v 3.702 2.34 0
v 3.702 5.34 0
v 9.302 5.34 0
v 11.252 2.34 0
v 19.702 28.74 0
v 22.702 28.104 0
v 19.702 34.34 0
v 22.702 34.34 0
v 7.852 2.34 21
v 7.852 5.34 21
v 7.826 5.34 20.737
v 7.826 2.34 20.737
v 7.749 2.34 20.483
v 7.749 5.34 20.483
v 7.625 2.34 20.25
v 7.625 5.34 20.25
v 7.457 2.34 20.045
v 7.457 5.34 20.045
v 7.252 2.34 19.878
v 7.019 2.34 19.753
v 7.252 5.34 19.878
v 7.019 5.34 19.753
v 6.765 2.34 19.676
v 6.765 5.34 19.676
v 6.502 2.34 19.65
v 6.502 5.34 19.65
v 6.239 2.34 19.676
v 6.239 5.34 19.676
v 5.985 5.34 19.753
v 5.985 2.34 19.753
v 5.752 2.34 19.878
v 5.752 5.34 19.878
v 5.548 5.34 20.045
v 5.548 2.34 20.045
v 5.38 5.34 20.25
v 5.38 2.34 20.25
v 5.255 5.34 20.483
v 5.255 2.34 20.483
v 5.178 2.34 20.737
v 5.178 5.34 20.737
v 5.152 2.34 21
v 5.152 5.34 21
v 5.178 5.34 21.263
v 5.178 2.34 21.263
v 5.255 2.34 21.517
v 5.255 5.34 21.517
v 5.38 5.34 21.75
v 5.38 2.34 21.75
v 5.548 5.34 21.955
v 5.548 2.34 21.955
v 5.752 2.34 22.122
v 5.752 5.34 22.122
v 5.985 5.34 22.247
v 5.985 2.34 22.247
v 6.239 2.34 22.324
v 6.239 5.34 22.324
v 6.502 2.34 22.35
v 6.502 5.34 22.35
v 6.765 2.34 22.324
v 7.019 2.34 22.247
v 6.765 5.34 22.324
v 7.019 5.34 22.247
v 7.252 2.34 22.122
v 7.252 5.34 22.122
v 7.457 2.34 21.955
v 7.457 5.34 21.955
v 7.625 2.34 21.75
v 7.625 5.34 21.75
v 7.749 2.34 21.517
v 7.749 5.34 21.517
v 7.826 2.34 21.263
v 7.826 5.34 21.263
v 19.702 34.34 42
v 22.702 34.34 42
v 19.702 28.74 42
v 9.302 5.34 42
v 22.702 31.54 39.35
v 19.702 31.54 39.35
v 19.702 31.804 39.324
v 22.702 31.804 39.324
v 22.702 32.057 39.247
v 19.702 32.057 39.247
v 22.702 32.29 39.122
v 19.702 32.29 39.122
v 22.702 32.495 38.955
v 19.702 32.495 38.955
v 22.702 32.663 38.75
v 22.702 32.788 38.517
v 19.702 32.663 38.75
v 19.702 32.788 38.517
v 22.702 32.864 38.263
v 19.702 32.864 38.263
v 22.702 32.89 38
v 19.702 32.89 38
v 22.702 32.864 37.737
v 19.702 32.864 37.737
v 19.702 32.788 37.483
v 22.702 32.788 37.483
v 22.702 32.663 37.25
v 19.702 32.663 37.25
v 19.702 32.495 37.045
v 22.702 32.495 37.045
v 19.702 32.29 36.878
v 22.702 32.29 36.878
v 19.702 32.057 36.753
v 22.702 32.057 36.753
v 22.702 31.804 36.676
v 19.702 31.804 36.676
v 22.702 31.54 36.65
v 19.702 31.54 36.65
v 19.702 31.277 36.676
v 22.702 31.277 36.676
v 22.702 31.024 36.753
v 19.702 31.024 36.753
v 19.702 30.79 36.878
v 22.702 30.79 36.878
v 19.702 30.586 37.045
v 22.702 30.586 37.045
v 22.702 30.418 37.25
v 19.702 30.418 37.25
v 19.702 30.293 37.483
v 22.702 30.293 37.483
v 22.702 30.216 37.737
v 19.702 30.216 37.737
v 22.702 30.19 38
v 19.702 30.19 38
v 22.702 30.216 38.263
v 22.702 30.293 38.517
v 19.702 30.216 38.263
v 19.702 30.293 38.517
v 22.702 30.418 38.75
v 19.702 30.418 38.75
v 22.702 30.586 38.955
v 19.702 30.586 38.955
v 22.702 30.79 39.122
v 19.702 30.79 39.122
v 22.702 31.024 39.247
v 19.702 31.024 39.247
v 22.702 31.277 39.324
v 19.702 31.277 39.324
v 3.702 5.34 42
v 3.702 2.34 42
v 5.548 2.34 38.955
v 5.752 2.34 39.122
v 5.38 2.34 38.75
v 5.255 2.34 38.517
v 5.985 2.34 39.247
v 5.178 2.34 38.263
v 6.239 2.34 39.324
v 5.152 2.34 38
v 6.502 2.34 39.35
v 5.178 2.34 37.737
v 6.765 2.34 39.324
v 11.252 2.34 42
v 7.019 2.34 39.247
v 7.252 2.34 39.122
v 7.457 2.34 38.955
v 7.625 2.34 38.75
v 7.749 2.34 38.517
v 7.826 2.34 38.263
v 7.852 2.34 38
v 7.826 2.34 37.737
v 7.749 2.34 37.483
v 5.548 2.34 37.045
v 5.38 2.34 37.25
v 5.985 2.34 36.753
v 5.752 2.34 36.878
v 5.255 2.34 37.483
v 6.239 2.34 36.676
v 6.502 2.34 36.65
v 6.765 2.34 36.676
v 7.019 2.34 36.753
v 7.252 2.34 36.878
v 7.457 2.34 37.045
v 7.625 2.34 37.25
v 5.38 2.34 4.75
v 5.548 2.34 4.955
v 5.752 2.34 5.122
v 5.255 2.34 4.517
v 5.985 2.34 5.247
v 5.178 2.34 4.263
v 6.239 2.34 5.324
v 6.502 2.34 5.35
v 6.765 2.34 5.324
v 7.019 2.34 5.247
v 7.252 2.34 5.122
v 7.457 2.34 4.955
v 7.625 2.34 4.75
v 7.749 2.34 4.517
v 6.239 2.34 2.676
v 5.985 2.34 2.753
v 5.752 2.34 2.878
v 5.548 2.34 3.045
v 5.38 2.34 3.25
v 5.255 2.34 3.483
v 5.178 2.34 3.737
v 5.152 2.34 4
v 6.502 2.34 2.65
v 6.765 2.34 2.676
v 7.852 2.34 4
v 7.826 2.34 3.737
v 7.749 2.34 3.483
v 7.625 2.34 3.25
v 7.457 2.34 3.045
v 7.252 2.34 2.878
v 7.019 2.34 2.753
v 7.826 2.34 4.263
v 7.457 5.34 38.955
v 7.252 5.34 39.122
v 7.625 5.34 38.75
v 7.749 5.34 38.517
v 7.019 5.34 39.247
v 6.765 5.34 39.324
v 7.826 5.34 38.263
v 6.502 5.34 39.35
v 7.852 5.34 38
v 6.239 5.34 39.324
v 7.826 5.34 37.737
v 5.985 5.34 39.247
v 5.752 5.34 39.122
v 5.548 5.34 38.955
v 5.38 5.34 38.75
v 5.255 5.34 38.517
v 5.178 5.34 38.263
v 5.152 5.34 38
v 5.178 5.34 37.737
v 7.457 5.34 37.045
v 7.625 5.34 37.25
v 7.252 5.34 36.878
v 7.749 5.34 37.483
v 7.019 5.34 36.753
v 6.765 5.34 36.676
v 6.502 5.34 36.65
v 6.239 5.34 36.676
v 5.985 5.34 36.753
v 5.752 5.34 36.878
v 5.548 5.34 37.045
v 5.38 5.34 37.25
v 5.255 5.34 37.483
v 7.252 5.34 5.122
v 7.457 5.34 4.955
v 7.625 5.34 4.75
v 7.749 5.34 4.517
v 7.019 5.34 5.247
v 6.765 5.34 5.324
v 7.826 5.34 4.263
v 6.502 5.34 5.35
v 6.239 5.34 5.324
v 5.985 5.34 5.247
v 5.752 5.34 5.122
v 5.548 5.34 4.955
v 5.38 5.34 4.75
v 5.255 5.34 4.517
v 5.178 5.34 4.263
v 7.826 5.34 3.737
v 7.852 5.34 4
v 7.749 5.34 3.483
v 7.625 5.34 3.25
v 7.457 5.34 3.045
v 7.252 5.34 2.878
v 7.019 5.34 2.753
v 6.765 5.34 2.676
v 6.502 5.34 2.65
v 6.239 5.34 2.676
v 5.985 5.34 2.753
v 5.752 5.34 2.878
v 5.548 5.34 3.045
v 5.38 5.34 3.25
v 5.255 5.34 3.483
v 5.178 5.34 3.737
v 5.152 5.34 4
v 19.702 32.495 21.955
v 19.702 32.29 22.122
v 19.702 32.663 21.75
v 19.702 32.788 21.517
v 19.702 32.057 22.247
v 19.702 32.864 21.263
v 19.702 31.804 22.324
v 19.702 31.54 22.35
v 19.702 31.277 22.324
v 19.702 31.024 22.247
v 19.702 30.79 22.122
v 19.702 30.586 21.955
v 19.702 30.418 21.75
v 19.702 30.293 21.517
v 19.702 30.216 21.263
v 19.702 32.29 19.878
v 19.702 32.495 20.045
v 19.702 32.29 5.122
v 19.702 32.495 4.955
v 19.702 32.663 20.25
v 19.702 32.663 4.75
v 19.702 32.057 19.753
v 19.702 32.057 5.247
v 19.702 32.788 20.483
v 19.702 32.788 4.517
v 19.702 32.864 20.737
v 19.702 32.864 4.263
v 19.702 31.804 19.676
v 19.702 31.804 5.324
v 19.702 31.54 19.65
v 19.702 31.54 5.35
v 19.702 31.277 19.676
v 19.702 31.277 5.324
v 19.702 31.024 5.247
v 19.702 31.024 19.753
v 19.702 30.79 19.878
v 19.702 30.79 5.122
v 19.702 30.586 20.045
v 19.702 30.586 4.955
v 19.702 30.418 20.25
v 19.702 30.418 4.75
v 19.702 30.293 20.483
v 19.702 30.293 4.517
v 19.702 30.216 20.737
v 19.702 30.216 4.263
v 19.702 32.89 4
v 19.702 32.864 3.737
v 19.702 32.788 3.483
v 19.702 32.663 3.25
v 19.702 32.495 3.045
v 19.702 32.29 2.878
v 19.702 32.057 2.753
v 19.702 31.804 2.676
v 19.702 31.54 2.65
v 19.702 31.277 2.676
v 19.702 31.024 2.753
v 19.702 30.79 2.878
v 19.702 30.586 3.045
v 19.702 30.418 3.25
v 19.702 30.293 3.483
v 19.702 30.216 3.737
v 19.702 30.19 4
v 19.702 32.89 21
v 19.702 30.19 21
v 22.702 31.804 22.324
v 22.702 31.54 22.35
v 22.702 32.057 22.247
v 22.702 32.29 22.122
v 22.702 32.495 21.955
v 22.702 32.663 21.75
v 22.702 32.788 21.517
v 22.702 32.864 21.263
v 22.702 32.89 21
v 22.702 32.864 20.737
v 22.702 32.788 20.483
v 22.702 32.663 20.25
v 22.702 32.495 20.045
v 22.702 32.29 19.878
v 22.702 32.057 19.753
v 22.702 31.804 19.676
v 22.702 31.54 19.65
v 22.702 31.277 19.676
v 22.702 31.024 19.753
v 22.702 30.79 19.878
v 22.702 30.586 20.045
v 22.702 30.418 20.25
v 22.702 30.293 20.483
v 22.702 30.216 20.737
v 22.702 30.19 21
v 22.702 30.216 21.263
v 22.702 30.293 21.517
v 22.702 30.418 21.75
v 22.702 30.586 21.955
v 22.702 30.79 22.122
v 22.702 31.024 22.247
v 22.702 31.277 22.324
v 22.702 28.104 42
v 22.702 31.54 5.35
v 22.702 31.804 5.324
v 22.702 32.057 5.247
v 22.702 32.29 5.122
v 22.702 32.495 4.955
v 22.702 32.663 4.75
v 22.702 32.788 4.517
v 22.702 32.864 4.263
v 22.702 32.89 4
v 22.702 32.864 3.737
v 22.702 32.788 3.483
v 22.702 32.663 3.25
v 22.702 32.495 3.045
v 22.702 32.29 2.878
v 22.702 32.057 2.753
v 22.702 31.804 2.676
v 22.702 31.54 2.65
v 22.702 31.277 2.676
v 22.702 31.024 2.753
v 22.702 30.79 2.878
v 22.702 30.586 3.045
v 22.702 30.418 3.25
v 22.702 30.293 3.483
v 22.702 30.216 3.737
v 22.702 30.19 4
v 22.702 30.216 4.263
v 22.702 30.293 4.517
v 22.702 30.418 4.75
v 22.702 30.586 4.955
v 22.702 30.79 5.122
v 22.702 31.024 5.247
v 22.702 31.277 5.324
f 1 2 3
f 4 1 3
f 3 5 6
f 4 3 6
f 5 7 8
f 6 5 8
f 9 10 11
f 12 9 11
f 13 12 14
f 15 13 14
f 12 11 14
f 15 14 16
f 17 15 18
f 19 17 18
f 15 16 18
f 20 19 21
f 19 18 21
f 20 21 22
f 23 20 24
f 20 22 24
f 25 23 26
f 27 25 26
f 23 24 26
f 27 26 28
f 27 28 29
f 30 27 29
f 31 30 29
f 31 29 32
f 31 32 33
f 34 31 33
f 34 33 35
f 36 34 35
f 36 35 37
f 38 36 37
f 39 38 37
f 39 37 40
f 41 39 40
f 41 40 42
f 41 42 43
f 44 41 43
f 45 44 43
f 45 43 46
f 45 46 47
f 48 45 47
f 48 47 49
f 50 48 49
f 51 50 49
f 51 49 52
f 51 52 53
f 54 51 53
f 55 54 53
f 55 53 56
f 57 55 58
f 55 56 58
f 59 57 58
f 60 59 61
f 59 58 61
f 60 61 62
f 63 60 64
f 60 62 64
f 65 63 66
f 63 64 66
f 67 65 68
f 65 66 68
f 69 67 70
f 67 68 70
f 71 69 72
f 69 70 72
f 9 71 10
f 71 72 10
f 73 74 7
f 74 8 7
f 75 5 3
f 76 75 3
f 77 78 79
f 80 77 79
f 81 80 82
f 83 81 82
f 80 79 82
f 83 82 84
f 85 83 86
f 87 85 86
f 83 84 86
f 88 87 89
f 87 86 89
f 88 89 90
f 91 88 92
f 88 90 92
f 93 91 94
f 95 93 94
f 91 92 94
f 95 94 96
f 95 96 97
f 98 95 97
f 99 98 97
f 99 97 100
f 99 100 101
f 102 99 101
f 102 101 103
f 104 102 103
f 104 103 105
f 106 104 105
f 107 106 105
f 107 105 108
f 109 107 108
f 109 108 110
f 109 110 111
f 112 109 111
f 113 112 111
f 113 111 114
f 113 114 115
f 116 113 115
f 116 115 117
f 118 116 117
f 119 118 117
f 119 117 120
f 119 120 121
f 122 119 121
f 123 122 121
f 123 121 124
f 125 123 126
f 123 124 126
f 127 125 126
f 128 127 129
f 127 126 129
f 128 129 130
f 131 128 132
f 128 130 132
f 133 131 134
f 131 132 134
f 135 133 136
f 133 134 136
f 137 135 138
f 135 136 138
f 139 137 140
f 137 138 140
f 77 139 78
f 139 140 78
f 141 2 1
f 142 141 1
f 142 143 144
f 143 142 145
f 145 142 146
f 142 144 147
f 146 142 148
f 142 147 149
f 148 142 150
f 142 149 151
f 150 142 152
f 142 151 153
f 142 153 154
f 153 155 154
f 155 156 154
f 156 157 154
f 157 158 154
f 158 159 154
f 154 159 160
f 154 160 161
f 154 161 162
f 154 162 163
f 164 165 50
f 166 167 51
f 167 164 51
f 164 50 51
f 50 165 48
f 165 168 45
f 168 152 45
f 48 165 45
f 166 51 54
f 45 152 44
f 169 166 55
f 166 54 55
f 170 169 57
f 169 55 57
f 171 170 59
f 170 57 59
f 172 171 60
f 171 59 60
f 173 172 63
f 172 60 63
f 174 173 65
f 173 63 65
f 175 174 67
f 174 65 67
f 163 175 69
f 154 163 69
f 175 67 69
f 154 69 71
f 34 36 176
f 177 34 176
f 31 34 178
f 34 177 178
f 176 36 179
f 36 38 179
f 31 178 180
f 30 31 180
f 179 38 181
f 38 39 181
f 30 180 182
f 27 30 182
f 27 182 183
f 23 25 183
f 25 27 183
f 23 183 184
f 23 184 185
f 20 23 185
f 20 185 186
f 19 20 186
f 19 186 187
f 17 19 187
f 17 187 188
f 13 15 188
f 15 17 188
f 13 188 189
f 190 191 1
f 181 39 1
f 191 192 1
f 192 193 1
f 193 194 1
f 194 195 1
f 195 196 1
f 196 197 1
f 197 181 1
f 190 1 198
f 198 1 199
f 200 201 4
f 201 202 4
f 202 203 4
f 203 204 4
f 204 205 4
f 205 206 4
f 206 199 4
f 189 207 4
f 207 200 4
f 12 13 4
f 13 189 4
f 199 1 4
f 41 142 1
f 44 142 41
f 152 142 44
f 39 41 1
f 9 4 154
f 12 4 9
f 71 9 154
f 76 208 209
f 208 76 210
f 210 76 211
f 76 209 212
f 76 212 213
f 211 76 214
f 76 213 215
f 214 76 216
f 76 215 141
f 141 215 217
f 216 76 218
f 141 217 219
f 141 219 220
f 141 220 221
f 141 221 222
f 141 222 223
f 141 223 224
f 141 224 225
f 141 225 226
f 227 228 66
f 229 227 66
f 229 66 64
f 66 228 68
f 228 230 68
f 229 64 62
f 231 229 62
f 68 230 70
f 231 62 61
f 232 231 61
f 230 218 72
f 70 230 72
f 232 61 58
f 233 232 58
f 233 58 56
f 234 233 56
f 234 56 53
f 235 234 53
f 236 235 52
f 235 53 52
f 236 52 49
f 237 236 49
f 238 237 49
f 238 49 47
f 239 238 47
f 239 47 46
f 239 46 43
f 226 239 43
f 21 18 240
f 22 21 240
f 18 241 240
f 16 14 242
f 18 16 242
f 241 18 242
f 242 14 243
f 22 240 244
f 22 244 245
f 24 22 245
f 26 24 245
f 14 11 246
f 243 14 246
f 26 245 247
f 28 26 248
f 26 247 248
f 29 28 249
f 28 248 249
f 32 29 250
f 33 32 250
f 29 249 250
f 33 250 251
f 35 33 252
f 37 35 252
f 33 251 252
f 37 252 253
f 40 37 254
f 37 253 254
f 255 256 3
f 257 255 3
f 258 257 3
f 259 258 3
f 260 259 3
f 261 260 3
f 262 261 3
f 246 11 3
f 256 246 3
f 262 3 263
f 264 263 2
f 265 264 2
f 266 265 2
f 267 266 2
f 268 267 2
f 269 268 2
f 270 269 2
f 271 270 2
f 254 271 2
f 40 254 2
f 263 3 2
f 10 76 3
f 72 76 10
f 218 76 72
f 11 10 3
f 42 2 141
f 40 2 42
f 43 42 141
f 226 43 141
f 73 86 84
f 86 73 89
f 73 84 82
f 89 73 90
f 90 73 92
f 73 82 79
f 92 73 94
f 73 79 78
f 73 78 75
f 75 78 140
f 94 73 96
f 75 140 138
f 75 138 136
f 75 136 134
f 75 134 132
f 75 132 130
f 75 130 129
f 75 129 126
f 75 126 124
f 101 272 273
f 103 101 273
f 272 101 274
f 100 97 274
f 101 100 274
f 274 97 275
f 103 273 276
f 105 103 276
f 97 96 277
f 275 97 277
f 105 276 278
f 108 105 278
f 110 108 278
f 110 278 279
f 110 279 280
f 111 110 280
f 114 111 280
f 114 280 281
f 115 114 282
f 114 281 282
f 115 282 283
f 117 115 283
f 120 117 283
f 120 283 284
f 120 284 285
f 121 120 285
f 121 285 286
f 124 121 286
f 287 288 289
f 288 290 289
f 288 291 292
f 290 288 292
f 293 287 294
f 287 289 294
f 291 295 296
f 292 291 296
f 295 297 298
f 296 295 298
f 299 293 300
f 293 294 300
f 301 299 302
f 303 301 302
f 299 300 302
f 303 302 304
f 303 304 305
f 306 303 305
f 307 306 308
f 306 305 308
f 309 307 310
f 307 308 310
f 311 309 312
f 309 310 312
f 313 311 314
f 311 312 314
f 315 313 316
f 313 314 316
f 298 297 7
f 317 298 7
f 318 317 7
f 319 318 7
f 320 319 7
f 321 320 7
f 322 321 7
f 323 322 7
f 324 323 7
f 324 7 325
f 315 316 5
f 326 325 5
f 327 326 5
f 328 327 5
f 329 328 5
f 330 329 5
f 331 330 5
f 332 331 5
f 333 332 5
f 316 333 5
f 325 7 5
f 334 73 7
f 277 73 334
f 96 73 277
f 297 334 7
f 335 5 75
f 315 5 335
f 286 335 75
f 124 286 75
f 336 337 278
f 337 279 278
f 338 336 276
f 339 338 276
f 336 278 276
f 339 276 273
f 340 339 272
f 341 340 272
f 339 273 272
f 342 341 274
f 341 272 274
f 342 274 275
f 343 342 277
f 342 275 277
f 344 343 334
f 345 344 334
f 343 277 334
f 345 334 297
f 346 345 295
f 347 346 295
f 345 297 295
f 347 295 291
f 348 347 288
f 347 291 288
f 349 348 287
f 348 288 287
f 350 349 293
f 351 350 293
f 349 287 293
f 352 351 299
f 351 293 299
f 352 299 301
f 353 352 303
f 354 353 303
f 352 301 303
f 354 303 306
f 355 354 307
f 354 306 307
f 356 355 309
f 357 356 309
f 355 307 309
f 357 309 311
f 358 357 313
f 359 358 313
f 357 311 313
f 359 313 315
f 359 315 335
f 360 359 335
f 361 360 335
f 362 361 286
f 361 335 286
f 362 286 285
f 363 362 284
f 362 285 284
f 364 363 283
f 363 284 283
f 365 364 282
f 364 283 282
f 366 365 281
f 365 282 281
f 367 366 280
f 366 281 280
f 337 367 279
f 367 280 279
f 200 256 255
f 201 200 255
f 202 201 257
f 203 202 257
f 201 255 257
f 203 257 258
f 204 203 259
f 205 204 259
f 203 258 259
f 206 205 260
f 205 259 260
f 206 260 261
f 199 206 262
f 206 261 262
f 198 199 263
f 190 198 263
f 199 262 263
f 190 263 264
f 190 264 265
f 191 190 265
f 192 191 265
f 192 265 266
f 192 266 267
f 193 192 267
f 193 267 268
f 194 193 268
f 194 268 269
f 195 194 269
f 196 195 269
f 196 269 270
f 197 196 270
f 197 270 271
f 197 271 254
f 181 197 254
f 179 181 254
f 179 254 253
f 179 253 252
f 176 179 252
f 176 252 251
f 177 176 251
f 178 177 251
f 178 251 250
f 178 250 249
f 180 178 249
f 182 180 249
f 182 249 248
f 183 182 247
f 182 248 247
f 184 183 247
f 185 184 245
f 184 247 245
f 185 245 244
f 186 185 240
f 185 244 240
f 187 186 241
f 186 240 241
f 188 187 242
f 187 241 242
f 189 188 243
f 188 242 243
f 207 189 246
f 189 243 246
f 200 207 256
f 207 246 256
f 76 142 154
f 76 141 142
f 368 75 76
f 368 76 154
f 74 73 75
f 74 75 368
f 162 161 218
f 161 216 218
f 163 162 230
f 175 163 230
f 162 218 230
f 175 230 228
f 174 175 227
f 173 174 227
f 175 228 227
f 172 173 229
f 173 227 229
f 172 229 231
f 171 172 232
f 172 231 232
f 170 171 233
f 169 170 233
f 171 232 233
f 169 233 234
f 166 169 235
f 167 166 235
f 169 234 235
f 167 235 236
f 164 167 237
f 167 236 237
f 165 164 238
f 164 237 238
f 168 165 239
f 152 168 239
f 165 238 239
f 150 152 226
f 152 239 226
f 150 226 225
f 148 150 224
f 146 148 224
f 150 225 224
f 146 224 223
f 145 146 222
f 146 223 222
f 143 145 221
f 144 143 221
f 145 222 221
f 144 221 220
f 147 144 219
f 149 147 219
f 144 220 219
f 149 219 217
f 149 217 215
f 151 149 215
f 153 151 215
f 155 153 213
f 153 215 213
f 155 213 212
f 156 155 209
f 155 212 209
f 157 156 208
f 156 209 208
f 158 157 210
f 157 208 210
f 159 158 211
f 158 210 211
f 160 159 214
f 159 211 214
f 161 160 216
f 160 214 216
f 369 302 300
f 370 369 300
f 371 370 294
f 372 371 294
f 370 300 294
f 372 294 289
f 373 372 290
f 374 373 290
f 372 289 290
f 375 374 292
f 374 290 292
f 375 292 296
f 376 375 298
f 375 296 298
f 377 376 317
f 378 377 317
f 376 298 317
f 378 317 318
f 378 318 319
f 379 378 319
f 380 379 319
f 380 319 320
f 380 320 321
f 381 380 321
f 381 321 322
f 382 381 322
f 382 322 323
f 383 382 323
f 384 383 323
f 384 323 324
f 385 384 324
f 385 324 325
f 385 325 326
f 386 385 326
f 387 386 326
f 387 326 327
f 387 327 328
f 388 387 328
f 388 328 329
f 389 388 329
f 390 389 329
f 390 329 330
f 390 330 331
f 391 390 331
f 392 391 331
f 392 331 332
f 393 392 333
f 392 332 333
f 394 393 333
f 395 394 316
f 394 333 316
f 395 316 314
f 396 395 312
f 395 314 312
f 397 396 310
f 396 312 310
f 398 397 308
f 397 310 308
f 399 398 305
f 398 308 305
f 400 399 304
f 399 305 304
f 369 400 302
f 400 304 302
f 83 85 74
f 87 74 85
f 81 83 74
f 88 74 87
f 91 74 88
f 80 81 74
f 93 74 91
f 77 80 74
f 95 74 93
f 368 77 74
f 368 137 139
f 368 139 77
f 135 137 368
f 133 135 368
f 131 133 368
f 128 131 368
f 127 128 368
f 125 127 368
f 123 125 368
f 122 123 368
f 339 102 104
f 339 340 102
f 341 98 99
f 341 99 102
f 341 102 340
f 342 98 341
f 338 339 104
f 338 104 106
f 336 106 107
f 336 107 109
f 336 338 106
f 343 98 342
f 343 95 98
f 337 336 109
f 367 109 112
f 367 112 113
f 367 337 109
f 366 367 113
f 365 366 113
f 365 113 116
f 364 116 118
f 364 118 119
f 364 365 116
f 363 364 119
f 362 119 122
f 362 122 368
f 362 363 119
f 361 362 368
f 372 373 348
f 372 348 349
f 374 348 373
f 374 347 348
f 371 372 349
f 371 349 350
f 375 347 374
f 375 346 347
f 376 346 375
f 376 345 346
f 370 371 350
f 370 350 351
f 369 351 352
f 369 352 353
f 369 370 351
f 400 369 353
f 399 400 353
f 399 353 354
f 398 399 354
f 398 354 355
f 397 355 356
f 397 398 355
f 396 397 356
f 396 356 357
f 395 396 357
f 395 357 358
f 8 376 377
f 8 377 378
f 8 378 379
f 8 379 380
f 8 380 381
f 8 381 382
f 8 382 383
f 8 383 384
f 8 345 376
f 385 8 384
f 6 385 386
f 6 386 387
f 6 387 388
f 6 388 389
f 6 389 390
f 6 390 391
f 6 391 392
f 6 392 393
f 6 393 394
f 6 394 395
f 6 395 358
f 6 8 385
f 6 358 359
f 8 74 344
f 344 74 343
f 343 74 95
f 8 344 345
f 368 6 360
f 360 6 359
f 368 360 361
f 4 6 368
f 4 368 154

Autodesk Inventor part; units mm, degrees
ref_plane "YZ Plane" through (0, 0, 0) normal (1, 0, 0) x (0, 1, 0)
ref_plane "XZ Plane" through (0, 0, 0) normal (0, 1, 0) x (-1, 0, 0)
ref_plane "XY Plane" through (0, 0, 0) normal (0, 0, 1) x (1, 0, 0)
sketch "Sketch1" plane through (0, 0, 0) normal (0, 0, 1) x (1, 0, 0)
  line L0 (22.7021, 34.3404) -> (19.7021, 34.3404)
  line L1 (19.7021, 34.3404) -> (19.7021, 28.7404)
  line L2 (19.7021, 28.7404) -> (9.3021, 5.3404)
  line L3 (22.7021, 28.1038) -> (11.2517, 2.3404)
  line L4 (9.3021, 5.3404) -> (3.7021, 5.3404)
  line L5 (3.7021, 5.3404) -> (3.7021, 2.3404)
  line L6 (22.7021, 34.3404) -> (22.7021, 28.1038)
  line L7 (3.7021, 2.3404) -> (11.2517, 2.3404)
  point P0 (0, 0)
  dimension "d0" = 3
  dimension "d1" = 3
  dimension "d2" = 32
  dimension "d3" = 19
  dimension "d4" = 5.6
  dimension "d5" = 5.6
  dimension "d6" = 3
extrude "Extrusion1" add sketch "Sketch1" along normal blind 42
sketch "Sketch2" plane through (3.7021, 5.3404, 0) normal (0, 1, 0) x (1, 0, 0)
  line L0 (0, -42) -> (5.6, -42) projected
  circle A0 centre (2.8, -4) radius 1.35
  circle A1 centre (2.8, -21) radius 1.35
  circle A2 centre (2.8, -38) radius 1.35
  point P0 (-3.7021, 0)
  dimension "d9" = 2.7
  dimension "d10" = 2.7
  dimension "d11" = 2.7
  dimension "d12" = 17
  dimension "d13" = 17
  dimension "d14" = 4
extrude "Extrusion2" cut sketch "Sketch2" against normal through all
sketch "Sketch3" plane through (19.7021, 28.7404, 0) normal (-1, 0, 0) x (0, 0, 1)
  line L0 (0, 5.6) -> (42, 5.6) projected
  line L1 (0, 5.6) -> (0, 0) projected
  circle A0 centre (4, 2.8) radius 1.35
  circle A1 centre (21, 2.8) radius 1.35
  circle A2 centre (38, 2.8) radius 1.35
  point P0 (0, -28.7404)
  dimension "d17" = 2.7
  dimension "d18" = 2.7
  dimension "d19" = 2.7
  dimension "d20" = 17
  dimension "d21" = 17
  dimension "d22" = 4
  dimension "d23" = 2.8
  dimension "d24" = 2.8
  dimension "d25" = 2.8
extrude "Extrusion3" cut sketch "Sketch3" against normal through all
properties part number "Trunk" material "Aluminum-6061"
